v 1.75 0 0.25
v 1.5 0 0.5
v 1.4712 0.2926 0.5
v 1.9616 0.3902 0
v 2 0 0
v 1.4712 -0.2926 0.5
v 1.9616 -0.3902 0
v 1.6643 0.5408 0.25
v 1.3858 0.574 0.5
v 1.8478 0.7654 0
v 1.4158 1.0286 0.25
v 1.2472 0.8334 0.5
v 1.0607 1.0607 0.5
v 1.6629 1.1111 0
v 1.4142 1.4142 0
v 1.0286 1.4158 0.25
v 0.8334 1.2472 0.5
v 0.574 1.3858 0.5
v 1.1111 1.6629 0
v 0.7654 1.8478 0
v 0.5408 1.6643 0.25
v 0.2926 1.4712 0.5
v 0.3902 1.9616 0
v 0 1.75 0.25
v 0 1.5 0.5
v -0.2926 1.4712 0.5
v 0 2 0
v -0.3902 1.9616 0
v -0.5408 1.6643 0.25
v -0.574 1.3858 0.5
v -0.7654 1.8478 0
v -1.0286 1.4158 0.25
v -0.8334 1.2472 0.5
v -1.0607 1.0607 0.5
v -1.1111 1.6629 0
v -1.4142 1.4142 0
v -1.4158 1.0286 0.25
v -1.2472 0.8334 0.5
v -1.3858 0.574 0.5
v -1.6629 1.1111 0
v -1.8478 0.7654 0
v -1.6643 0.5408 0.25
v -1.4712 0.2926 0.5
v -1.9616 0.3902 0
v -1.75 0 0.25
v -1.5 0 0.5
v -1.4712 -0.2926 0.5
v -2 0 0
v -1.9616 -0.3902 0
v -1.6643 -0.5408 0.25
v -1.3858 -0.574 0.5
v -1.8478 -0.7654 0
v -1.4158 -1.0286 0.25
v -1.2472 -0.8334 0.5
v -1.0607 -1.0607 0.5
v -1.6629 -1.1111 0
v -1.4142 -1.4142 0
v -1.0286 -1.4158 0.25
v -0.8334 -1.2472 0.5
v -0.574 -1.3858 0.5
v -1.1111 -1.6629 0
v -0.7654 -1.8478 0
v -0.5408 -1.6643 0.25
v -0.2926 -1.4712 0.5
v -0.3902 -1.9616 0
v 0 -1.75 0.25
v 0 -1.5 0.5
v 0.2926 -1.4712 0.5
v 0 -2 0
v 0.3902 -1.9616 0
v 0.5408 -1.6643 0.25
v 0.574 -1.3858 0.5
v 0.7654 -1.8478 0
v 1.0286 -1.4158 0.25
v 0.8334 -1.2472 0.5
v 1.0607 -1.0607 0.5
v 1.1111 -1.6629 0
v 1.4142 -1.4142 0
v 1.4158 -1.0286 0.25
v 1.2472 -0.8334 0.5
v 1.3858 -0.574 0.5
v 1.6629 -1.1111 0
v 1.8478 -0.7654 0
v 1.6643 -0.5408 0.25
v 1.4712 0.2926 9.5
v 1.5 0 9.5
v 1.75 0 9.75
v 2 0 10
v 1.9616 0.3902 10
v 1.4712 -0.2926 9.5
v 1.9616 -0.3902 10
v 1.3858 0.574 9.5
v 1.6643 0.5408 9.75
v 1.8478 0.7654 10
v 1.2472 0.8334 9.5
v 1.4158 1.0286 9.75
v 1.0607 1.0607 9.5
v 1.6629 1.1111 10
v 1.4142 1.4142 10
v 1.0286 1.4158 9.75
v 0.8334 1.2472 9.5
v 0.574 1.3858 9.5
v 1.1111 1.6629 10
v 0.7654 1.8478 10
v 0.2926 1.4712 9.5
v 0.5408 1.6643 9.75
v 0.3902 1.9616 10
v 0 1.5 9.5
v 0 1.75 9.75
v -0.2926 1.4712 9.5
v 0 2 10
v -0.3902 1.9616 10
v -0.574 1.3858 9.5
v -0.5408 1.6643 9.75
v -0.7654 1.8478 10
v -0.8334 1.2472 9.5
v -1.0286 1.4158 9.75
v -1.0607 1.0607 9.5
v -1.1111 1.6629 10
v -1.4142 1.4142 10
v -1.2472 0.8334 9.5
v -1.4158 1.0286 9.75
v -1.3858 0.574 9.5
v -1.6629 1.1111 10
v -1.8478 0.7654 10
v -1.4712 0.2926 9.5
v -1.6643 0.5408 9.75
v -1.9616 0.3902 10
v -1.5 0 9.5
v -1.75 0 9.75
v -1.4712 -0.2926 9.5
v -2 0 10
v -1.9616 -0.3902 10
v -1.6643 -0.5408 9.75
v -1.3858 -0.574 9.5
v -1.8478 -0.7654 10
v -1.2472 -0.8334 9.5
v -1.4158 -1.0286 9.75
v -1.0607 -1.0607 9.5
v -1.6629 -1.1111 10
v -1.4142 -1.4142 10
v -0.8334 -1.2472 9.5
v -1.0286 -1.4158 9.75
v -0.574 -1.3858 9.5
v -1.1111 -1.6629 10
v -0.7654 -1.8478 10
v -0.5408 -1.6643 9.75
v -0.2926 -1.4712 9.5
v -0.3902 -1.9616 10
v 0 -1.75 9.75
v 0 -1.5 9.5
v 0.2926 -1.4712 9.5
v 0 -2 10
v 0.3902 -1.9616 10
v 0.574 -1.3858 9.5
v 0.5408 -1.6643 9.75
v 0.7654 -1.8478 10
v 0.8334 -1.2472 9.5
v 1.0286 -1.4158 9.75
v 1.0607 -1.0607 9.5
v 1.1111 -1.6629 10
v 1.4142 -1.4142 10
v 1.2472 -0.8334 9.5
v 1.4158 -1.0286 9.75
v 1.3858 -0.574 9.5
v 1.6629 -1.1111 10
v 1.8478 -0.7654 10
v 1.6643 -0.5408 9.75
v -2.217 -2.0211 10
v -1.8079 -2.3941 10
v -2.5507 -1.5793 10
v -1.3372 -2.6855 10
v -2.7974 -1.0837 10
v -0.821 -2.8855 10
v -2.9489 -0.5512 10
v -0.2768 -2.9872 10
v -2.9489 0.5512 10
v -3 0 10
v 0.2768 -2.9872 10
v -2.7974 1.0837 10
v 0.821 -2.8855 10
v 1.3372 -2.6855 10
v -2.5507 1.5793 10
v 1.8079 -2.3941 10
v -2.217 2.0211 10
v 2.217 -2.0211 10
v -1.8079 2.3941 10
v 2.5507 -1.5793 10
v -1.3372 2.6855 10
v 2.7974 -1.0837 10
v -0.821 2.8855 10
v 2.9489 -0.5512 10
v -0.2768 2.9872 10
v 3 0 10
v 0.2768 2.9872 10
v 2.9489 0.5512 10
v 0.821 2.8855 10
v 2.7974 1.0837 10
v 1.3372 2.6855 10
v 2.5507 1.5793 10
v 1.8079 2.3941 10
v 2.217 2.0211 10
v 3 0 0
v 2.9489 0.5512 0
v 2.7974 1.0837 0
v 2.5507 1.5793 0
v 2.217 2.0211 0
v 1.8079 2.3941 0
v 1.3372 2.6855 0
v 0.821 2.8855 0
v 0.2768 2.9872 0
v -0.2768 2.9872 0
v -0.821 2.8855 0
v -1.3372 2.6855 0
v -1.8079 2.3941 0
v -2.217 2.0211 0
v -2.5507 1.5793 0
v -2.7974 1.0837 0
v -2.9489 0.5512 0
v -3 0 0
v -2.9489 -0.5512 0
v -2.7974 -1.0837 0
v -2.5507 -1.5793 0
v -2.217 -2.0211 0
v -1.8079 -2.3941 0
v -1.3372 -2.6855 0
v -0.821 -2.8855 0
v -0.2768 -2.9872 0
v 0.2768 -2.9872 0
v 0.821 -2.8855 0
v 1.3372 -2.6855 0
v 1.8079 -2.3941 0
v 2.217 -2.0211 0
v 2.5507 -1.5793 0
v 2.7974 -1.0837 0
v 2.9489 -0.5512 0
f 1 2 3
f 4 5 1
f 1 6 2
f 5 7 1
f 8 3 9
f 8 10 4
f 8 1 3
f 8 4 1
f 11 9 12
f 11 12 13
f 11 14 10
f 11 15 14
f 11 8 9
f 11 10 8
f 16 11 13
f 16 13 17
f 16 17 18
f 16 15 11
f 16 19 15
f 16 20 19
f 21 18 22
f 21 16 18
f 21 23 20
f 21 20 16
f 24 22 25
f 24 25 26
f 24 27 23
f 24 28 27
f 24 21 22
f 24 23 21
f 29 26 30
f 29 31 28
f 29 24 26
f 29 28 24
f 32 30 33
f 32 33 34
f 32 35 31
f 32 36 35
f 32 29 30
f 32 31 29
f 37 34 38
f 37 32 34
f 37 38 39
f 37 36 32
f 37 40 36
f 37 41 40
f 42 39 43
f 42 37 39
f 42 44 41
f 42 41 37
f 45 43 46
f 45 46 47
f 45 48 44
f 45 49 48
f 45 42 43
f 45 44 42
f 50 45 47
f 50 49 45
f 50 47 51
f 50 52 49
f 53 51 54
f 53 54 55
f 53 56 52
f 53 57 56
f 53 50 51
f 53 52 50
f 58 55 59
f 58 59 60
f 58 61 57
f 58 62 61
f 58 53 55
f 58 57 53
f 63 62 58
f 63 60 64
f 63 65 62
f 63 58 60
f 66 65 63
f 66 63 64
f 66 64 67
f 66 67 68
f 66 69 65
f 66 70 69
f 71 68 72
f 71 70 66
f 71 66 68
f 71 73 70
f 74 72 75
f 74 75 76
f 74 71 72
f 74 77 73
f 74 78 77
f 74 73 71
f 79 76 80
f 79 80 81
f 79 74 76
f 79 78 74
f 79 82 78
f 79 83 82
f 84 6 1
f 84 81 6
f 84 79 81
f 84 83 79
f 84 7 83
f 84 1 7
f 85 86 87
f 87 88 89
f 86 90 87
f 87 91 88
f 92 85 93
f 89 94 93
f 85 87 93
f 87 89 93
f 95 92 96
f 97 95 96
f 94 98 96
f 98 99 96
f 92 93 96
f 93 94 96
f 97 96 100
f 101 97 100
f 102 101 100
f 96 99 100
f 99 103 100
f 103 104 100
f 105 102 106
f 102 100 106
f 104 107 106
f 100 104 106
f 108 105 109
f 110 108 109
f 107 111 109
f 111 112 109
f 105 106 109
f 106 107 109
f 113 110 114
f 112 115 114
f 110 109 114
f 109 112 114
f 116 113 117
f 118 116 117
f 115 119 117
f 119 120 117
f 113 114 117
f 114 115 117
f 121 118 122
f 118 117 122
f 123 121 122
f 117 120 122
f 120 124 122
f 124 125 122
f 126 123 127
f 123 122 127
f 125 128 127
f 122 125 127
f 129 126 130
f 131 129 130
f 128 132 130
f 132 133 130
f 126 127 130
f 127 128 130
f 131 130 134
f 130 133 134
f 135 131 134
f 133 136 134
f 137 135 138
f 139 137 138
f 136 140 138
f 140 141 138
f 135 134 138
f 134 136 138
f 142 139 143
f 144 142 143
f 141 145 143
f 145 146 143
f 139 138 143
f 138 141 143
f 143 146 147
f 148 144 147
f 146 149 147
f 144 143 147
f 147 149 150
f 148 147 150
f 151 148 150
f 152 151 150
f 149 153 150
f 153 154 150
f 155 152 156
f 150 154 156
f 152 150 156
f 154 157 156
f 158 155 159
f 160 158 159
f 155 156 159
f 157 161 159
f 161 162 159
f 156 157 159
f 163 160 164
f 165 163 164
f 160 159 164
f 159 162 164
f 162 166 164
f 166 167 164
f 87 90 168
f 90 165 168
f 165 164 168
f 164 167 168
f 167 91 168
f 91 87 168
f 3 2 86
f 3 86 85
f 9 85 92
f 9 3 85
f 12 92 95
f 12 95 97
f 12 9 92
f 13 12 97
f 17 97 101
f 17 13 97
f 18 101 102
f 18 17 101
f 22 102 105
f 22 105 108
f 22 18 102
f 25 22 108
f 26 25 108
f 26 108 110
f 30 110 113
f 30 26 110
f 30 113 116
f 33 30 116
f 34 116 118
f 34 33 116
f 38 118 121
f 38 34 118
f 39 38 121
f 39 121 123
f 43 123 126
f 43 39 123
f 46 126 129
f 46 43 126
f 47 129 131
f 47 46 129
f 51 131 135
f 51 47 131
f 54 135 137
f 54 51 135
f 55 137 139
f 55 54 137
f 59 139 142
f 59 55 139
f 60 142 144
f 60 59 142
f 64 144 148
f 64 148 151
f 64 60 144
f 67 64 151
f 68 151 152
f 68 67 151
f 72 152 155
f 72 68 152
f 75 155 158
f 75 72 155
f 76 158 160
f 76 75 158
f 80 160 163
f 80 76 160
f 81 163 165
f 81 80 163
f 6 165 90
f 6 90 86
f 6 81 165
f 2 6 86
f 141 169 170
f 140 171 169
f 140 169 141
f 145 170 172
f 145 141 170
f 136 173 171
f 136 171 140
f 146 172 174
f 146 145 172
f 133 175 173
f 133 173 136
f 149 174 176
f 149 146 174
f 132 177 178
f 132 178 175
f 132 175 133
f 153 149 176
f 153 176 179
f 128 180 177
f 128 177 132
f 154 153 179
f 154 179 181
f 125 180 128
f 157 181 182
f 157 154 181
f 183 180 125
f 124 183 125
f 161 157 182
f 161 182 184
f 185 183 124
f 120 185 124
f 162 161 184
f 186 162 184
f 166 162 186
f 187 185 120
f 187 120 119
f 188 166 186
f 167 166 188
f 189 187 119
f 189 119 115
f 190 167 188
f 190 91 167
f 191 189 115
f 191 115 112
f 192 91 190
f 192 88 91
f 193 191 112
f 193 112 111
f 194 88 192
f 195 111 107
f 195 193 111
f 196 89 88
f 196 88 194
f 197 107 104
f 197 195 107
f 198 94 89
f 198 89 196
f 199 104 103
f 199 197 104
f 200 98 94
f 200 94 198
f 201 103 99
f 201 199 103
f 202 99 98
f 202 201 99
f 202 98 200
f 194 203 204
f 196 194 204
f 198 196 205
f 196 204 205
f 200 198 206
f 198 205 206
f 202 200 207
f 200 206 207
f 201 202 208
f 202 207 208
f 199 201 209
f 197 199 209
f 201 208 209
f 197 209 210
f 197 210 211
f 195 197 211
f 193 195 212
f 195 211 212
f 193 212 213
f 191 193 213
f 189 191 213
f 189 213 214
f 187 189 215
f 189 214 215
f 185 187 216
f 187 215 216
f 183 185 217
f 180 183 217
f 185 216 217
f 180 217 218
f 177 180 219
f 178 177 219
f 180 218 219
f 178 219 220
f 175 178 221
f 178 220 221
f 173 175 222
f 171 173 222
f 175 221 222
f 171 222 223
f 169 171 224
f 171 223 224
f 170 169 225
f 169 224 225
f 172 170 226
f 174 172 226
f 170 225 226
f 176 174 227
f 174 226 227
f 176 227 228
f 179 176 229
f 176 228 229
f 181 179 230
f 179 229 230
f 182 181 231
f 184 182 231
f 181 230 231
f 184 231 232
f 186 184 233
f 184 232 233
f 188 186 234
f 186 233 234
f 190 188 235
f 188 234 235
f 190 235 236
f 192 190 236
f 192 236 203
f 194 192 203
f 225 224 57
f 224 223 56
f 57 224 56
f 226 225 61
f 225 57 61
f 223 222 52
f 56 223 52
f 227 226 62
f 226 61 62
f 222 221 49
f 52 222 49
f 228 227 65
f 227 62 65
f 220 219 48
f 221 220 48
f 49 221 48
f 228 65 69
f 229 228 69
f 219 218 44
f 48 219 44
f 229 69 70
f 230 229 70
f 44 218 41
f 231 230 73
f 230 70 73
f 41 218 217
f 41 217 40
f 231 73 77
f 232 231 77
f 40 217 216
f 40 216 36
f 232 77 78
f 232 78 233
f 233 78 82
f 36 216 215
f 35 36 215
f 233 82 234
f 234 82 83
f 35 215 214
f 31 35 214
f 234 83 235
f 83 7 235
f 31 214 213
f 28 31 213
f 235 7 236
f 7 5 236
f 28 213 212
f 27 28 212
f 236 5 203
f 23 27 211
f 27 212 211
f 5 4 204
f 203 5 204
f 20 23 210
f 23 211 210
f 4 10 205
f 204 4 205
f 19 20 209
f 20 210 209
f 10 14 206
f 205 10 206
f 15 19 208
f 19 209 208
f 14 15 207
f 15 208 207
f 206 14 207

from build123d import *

# Parameters (mm, degrees)
SCHIZZO1_R                   = 3
SCHIZZO1_R_2                 = 1.5
ESTRUSIONE_ESTRUSIONE1_DEPTH = 10
SMUSSO1_SIZE                 = 0.5
CHAMFER1_SIZE                = 0.5


with BuildPart() as part:
    # Schizzo1 → Estrusione-Estrusione1 (new body)
    with BuildSketch(Plane.XY):
        Circle(SCHIZZO1_R)
        Circle(SCHIZZO1_R_2, mode=Mode.SUBTRACT)
    extrude(amount=ESTRUSIONE_ESTRUSIONE1_DEPTH)

    # Smusso1
    smusso1_edges = [part.edges().sort_by_distance(p)[0] for p in [
        (-1.5, 0, 10),
    ]]
    chamfer(smusso1_edges, length=SMUSSO1_SIZE)

    # Chamfer1
    chamfer1_edges = [part.edges().sort_by_distance(p)[0] for p in [
        (-1.5, 0, 0),
    ]]
    chamfer(chamfer1_edges, length=CHAMFER1_SIZE)


solid = part.part
